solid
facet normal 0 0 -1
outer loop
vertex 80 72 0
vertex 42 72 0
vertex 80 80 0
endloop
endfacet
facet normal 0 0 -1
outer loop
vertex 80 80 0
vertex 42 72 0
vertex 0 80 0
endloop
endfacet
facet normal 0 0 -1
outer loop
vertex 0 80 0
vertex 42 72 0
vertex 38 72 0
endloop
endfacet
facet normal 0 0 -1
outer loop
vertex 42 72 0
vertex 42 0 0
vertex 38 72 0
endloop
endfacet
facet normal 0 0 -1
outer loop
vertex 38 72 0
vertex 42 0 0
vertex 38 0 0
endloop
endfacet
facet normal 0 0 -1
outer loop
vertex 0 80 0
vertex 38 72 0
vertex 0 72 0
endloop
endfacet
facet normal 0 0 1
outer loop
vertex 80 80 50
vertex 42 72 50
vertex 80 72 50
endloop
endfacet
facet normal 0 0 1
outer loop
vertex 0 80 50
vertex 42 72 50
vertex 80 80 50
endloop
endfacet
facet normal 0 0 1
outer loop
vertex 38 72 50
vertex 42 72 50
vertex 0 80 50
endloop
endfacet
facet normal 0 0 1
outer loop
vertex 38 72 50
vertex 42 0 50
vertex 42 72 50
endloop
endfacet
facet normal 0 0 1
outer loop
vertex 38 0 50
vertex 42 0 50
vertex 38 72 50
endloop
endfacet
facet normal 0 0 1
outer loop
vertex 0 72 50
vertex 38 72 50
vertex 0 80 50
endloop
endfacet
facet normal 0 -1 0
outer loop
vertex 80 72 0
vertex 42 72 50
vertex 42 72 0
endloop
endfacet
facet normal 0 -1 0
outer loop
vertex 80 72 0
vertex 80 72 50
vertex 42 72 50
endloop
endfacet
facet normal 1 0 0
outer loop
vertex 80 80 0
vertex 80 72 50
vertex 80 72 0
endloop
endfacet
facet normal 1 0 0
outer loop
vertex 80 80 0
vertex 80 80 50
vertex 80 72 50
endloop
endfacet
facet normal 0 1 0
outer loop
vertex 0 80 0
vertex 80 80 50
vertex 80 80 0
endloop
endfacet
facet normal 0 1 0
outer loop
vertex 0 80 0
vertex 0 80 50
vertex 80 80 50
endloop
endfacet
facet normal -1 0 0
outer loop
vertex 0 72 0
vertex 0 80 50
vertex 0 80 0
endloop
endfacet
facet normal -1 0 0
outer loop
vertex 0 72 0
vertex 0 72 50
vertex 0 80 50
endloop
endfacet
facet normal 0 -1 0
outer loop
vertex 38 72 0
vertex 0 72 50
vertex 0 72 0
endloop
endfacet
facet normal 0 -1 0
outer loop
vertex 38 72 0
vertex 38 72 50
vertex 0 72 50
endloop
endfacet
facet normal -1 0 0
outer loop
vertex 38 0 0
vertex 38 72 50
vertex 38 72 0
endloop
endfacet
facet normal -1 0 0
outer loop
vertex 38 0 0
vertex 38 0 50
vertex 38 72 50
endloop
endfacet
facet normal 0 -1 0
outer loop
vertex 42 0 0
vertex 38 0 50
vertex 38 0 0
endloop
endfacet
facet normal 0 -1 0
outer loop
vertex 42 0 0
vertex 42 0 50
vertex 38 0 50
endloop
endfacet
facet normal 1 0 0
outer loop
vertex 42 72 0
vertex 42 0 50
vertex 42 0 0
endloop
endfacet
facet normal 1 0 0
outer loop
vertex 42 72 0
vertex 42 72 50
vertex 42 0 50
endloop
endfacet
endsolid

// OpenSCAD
$fn = 32;

// ----------------------------------------------------------------------
// Structural section: tee 80 x 80 mm
// ----------------------------------------------------------------------

// --- parameters (mm) ---
sec_w = 80;               // tee width, X
sec_h = 80;               // tee height, Y
flange_t = 8;             // top flange thickness
web_t = 4;                // web thickness
plate_t = 50;             // cut length, Z (extrusion height)

profile = [[38, 0], [42, 0], [42, 72], [80, 72], [80, 80], [0, 80], [0, 72], [38, 72]];  // primary outline, 8 points, counter clockwise

// --- the one profile operation ---
linear_extrude(height = plate_t) polygon(points = profile);
